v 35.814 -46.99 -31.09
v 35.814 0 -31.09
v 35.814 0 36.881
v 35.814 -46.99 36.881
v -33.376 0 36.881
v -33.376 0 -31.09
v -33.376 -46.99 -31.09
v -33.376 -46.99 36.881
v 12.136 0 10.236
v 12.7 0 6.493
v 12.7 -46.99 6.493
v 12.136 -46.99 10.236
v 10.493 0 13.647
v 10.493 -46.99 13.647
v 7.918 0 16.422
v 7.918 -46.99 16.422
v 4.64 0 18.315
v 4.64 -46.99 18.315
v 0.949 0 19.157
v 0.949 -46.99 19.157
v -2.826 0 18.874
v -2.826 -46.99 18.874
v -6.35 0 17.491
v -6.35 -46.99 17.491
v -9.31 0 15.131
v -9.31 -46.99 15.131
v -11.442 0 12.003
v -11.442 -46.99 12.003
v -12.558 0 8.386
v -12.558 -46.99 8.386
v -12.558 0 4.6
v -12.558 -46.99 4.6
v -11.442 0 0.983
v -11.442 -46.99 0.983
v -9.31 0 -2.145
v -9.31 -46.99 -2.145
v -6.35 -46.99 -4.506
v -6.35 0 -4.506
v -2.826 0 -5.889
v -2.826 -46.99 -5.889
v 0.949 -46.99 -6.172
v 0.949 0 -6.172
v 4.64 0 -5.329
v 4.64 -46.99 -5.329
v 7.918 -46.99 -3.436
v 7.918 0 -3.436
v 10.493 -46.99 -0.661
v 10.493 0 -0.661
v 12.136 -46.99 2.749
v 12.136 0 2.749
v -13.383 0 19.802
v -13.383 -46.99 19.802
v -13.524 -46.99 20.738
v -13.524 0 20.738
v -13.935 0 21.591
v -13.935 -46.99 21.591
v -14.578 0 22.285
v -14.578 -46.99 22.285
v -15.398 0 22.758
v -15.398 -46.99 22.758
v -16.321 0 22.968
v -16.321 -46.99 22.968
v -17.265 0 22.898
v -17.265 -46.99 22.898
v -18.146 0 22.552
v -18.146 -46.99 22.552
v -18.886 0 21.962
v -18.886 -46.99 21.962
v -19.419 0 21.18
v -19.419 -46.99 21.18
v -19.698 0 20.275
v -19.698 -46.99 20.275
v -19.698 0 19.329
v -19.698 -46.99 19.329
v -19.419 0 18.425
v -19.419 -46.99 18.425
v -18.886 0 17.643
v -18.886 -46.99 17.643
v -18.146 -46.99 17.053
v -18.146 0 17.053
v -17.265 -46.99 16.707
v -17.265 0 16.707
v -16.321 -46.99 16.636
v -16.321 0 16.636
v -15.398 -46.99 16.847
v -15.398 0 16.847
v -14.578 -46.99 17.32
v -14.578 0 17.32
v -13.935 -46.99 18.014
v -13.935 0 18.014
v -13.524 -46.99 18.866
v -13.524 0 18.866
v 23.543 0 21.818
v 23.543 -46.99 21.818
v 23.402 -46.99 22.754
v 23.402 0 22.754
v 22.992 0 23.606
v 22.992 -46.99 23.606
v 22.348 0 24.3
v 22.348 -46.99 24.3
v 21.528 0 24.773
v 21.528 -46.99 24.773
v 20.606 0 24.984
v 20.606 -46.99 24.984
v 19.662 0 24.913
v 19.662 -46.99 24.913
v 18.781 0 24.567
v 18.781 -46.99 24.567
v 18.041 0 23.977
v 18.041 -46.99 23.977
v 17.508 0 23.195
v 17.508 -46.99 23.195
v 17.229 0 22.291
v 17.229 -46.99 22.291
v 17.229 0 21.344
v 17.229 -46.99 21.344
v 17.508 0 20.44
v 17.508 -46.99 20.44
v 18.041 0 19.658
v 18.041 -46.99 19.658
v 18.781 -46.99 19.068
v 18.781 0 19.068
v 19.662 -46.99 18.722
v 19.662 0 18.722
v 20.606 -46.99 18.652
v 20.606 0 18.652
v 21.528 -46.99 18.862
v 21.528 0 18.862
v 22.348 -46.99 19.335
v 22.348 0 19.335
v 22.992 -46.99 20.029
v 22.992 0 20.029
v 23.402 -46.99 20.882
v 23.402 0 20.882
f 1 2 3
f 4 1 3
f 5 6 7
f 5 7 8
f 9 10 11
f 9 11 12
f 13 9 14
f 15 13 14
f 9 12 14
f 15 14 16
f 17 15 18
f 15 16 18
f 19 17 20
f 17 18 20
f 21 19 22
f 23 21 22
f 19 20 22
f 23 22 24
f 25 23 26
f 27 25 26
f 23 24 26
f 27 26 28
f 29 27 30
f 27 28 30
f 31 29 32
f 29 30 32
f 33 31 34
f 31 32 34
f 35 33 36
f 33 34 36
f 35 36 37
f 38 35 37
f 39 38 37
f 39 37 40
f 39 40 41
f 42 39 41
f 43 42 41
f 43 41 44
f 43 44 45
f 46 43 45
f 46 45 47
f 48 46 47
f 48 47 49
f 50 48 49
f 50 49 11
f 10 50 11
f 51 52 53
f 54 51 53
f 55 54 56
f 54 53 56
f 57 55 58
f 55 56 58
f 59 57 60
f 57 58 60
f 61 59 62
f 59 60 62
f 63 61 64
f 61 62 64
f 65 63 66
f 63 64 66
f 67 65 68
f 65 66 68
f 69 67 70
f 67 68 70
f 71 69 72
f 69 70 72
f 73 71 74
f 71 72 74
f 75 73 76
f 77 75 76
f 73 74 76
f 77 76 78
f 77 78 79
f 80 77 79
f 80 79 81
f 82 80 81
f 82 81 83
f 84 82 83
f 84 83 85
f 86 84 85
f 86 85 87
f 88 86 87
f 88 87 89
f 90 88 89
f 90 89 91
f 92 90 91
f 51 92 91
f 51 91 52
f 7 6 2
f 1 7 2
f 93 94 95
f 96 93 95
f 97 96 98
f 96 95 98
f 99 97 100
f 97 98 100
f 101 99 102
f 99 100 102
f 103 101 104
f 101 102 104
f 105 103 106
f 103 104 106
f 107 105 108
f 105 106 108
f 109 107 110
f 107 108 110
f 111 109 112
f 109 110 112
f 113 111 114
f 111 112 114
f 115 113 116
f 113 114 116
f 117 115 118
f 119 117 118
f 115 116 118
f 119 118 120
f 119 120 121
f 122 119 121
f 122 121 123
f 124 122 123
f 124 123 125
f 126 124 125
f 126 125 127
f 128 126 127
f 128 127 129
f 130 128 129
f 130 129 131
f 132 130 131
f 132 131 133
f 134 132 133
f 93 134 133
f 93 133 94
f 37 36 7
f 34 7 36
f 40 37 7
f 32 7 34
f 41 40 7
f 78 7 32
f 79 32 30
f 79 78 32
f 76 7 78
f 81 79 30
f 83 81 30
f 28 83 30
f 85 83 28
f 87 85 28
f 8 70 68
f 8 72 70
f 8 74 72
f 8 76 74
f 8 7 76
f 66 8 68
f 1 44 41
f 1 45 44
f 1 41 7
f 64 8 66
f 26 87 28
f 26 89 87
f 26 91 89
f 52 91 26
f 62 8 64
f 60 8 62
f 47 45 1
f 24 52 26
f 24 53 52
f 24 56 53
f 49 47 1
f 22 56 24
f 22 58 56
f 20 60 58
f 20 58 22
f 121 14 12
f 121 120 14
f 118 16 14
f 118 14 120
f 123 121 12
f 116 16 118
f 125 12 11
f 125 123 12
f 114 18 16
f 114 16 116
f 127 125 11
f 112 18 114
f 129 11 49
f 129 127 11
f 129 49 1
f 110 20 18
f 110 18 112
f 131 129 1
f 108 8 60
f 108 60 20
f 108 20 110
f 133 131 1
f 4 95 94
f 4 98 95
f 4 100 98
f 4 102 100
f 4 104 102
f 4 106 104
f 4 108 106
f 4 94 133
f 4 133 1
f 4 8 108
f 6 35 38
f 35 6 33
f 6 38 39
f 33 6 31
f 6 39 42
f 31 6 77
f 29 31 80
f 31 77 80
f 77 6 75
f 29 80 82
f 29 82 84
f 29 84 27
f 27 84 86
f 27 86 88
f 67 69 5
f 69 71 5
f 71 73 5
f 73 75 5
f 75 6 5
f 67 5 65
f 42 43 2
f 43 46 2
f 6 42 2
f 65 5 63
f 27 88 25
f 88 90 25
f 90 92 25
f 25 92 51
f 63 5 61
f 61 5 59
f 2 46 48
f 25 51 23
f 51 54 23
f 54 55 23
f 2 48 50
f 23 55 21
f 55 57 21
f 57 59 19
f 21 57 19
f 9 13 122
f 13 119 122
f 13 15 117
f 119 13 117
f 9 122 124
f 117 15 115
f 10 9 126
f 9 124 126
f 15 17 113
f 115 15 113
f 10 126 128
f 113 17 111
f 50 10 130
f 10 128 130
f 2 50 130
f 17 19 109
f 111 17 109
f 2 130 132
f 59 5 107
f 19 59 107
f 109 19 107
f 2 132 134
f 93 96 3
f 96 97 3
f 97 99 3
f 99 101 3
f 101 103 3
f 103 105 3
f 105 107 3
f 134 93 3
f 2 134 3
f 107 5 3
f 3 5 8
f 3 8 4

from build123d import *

# Parameters (mm, degrees)
F0_W     = 69.189604
F0_H     = 67.970401
F1_DEPTH = 46.99
F4_D     = 25.4
F5_D     = 6.35
F6_D     = 6.35


with BuildPart() as f1:
    # F0 (on Front) → F1 (new body)
    with BuildSketch(Plane.XZ):
        with Locations((1.2192, 2.895598)):
            Rectangle(F0_W, F0_H)
    extrude(amount=F1_DEPTH)

    # F4 (through all)
    with Locations(Plane(origin=(0, 0, 0), x_dir=(-1, 0, 0), z_dir=(0, 1, 0))):
        with Locations((0, 6.492837)):
            Hole(F4_D / 2)

    # F5 (through all)
    with Locations(Plane(origin=(0, 0, 0), x_dir=(-1, 0, 0), z_dir=(0, 1, 0))):
        with Locations((-20.368258, 21.817673)):
            Hole(F5_D / 2)

    # F6 (through all)
    with Locations(Plane(origin=(0, 0, 0), x_dir=(-1, 0, 0), z_dir=(0, 1, 0))):
        with Locations((16.558066, 19.802285)):
            Hole(F6_D / 2)


solid = f1.part
